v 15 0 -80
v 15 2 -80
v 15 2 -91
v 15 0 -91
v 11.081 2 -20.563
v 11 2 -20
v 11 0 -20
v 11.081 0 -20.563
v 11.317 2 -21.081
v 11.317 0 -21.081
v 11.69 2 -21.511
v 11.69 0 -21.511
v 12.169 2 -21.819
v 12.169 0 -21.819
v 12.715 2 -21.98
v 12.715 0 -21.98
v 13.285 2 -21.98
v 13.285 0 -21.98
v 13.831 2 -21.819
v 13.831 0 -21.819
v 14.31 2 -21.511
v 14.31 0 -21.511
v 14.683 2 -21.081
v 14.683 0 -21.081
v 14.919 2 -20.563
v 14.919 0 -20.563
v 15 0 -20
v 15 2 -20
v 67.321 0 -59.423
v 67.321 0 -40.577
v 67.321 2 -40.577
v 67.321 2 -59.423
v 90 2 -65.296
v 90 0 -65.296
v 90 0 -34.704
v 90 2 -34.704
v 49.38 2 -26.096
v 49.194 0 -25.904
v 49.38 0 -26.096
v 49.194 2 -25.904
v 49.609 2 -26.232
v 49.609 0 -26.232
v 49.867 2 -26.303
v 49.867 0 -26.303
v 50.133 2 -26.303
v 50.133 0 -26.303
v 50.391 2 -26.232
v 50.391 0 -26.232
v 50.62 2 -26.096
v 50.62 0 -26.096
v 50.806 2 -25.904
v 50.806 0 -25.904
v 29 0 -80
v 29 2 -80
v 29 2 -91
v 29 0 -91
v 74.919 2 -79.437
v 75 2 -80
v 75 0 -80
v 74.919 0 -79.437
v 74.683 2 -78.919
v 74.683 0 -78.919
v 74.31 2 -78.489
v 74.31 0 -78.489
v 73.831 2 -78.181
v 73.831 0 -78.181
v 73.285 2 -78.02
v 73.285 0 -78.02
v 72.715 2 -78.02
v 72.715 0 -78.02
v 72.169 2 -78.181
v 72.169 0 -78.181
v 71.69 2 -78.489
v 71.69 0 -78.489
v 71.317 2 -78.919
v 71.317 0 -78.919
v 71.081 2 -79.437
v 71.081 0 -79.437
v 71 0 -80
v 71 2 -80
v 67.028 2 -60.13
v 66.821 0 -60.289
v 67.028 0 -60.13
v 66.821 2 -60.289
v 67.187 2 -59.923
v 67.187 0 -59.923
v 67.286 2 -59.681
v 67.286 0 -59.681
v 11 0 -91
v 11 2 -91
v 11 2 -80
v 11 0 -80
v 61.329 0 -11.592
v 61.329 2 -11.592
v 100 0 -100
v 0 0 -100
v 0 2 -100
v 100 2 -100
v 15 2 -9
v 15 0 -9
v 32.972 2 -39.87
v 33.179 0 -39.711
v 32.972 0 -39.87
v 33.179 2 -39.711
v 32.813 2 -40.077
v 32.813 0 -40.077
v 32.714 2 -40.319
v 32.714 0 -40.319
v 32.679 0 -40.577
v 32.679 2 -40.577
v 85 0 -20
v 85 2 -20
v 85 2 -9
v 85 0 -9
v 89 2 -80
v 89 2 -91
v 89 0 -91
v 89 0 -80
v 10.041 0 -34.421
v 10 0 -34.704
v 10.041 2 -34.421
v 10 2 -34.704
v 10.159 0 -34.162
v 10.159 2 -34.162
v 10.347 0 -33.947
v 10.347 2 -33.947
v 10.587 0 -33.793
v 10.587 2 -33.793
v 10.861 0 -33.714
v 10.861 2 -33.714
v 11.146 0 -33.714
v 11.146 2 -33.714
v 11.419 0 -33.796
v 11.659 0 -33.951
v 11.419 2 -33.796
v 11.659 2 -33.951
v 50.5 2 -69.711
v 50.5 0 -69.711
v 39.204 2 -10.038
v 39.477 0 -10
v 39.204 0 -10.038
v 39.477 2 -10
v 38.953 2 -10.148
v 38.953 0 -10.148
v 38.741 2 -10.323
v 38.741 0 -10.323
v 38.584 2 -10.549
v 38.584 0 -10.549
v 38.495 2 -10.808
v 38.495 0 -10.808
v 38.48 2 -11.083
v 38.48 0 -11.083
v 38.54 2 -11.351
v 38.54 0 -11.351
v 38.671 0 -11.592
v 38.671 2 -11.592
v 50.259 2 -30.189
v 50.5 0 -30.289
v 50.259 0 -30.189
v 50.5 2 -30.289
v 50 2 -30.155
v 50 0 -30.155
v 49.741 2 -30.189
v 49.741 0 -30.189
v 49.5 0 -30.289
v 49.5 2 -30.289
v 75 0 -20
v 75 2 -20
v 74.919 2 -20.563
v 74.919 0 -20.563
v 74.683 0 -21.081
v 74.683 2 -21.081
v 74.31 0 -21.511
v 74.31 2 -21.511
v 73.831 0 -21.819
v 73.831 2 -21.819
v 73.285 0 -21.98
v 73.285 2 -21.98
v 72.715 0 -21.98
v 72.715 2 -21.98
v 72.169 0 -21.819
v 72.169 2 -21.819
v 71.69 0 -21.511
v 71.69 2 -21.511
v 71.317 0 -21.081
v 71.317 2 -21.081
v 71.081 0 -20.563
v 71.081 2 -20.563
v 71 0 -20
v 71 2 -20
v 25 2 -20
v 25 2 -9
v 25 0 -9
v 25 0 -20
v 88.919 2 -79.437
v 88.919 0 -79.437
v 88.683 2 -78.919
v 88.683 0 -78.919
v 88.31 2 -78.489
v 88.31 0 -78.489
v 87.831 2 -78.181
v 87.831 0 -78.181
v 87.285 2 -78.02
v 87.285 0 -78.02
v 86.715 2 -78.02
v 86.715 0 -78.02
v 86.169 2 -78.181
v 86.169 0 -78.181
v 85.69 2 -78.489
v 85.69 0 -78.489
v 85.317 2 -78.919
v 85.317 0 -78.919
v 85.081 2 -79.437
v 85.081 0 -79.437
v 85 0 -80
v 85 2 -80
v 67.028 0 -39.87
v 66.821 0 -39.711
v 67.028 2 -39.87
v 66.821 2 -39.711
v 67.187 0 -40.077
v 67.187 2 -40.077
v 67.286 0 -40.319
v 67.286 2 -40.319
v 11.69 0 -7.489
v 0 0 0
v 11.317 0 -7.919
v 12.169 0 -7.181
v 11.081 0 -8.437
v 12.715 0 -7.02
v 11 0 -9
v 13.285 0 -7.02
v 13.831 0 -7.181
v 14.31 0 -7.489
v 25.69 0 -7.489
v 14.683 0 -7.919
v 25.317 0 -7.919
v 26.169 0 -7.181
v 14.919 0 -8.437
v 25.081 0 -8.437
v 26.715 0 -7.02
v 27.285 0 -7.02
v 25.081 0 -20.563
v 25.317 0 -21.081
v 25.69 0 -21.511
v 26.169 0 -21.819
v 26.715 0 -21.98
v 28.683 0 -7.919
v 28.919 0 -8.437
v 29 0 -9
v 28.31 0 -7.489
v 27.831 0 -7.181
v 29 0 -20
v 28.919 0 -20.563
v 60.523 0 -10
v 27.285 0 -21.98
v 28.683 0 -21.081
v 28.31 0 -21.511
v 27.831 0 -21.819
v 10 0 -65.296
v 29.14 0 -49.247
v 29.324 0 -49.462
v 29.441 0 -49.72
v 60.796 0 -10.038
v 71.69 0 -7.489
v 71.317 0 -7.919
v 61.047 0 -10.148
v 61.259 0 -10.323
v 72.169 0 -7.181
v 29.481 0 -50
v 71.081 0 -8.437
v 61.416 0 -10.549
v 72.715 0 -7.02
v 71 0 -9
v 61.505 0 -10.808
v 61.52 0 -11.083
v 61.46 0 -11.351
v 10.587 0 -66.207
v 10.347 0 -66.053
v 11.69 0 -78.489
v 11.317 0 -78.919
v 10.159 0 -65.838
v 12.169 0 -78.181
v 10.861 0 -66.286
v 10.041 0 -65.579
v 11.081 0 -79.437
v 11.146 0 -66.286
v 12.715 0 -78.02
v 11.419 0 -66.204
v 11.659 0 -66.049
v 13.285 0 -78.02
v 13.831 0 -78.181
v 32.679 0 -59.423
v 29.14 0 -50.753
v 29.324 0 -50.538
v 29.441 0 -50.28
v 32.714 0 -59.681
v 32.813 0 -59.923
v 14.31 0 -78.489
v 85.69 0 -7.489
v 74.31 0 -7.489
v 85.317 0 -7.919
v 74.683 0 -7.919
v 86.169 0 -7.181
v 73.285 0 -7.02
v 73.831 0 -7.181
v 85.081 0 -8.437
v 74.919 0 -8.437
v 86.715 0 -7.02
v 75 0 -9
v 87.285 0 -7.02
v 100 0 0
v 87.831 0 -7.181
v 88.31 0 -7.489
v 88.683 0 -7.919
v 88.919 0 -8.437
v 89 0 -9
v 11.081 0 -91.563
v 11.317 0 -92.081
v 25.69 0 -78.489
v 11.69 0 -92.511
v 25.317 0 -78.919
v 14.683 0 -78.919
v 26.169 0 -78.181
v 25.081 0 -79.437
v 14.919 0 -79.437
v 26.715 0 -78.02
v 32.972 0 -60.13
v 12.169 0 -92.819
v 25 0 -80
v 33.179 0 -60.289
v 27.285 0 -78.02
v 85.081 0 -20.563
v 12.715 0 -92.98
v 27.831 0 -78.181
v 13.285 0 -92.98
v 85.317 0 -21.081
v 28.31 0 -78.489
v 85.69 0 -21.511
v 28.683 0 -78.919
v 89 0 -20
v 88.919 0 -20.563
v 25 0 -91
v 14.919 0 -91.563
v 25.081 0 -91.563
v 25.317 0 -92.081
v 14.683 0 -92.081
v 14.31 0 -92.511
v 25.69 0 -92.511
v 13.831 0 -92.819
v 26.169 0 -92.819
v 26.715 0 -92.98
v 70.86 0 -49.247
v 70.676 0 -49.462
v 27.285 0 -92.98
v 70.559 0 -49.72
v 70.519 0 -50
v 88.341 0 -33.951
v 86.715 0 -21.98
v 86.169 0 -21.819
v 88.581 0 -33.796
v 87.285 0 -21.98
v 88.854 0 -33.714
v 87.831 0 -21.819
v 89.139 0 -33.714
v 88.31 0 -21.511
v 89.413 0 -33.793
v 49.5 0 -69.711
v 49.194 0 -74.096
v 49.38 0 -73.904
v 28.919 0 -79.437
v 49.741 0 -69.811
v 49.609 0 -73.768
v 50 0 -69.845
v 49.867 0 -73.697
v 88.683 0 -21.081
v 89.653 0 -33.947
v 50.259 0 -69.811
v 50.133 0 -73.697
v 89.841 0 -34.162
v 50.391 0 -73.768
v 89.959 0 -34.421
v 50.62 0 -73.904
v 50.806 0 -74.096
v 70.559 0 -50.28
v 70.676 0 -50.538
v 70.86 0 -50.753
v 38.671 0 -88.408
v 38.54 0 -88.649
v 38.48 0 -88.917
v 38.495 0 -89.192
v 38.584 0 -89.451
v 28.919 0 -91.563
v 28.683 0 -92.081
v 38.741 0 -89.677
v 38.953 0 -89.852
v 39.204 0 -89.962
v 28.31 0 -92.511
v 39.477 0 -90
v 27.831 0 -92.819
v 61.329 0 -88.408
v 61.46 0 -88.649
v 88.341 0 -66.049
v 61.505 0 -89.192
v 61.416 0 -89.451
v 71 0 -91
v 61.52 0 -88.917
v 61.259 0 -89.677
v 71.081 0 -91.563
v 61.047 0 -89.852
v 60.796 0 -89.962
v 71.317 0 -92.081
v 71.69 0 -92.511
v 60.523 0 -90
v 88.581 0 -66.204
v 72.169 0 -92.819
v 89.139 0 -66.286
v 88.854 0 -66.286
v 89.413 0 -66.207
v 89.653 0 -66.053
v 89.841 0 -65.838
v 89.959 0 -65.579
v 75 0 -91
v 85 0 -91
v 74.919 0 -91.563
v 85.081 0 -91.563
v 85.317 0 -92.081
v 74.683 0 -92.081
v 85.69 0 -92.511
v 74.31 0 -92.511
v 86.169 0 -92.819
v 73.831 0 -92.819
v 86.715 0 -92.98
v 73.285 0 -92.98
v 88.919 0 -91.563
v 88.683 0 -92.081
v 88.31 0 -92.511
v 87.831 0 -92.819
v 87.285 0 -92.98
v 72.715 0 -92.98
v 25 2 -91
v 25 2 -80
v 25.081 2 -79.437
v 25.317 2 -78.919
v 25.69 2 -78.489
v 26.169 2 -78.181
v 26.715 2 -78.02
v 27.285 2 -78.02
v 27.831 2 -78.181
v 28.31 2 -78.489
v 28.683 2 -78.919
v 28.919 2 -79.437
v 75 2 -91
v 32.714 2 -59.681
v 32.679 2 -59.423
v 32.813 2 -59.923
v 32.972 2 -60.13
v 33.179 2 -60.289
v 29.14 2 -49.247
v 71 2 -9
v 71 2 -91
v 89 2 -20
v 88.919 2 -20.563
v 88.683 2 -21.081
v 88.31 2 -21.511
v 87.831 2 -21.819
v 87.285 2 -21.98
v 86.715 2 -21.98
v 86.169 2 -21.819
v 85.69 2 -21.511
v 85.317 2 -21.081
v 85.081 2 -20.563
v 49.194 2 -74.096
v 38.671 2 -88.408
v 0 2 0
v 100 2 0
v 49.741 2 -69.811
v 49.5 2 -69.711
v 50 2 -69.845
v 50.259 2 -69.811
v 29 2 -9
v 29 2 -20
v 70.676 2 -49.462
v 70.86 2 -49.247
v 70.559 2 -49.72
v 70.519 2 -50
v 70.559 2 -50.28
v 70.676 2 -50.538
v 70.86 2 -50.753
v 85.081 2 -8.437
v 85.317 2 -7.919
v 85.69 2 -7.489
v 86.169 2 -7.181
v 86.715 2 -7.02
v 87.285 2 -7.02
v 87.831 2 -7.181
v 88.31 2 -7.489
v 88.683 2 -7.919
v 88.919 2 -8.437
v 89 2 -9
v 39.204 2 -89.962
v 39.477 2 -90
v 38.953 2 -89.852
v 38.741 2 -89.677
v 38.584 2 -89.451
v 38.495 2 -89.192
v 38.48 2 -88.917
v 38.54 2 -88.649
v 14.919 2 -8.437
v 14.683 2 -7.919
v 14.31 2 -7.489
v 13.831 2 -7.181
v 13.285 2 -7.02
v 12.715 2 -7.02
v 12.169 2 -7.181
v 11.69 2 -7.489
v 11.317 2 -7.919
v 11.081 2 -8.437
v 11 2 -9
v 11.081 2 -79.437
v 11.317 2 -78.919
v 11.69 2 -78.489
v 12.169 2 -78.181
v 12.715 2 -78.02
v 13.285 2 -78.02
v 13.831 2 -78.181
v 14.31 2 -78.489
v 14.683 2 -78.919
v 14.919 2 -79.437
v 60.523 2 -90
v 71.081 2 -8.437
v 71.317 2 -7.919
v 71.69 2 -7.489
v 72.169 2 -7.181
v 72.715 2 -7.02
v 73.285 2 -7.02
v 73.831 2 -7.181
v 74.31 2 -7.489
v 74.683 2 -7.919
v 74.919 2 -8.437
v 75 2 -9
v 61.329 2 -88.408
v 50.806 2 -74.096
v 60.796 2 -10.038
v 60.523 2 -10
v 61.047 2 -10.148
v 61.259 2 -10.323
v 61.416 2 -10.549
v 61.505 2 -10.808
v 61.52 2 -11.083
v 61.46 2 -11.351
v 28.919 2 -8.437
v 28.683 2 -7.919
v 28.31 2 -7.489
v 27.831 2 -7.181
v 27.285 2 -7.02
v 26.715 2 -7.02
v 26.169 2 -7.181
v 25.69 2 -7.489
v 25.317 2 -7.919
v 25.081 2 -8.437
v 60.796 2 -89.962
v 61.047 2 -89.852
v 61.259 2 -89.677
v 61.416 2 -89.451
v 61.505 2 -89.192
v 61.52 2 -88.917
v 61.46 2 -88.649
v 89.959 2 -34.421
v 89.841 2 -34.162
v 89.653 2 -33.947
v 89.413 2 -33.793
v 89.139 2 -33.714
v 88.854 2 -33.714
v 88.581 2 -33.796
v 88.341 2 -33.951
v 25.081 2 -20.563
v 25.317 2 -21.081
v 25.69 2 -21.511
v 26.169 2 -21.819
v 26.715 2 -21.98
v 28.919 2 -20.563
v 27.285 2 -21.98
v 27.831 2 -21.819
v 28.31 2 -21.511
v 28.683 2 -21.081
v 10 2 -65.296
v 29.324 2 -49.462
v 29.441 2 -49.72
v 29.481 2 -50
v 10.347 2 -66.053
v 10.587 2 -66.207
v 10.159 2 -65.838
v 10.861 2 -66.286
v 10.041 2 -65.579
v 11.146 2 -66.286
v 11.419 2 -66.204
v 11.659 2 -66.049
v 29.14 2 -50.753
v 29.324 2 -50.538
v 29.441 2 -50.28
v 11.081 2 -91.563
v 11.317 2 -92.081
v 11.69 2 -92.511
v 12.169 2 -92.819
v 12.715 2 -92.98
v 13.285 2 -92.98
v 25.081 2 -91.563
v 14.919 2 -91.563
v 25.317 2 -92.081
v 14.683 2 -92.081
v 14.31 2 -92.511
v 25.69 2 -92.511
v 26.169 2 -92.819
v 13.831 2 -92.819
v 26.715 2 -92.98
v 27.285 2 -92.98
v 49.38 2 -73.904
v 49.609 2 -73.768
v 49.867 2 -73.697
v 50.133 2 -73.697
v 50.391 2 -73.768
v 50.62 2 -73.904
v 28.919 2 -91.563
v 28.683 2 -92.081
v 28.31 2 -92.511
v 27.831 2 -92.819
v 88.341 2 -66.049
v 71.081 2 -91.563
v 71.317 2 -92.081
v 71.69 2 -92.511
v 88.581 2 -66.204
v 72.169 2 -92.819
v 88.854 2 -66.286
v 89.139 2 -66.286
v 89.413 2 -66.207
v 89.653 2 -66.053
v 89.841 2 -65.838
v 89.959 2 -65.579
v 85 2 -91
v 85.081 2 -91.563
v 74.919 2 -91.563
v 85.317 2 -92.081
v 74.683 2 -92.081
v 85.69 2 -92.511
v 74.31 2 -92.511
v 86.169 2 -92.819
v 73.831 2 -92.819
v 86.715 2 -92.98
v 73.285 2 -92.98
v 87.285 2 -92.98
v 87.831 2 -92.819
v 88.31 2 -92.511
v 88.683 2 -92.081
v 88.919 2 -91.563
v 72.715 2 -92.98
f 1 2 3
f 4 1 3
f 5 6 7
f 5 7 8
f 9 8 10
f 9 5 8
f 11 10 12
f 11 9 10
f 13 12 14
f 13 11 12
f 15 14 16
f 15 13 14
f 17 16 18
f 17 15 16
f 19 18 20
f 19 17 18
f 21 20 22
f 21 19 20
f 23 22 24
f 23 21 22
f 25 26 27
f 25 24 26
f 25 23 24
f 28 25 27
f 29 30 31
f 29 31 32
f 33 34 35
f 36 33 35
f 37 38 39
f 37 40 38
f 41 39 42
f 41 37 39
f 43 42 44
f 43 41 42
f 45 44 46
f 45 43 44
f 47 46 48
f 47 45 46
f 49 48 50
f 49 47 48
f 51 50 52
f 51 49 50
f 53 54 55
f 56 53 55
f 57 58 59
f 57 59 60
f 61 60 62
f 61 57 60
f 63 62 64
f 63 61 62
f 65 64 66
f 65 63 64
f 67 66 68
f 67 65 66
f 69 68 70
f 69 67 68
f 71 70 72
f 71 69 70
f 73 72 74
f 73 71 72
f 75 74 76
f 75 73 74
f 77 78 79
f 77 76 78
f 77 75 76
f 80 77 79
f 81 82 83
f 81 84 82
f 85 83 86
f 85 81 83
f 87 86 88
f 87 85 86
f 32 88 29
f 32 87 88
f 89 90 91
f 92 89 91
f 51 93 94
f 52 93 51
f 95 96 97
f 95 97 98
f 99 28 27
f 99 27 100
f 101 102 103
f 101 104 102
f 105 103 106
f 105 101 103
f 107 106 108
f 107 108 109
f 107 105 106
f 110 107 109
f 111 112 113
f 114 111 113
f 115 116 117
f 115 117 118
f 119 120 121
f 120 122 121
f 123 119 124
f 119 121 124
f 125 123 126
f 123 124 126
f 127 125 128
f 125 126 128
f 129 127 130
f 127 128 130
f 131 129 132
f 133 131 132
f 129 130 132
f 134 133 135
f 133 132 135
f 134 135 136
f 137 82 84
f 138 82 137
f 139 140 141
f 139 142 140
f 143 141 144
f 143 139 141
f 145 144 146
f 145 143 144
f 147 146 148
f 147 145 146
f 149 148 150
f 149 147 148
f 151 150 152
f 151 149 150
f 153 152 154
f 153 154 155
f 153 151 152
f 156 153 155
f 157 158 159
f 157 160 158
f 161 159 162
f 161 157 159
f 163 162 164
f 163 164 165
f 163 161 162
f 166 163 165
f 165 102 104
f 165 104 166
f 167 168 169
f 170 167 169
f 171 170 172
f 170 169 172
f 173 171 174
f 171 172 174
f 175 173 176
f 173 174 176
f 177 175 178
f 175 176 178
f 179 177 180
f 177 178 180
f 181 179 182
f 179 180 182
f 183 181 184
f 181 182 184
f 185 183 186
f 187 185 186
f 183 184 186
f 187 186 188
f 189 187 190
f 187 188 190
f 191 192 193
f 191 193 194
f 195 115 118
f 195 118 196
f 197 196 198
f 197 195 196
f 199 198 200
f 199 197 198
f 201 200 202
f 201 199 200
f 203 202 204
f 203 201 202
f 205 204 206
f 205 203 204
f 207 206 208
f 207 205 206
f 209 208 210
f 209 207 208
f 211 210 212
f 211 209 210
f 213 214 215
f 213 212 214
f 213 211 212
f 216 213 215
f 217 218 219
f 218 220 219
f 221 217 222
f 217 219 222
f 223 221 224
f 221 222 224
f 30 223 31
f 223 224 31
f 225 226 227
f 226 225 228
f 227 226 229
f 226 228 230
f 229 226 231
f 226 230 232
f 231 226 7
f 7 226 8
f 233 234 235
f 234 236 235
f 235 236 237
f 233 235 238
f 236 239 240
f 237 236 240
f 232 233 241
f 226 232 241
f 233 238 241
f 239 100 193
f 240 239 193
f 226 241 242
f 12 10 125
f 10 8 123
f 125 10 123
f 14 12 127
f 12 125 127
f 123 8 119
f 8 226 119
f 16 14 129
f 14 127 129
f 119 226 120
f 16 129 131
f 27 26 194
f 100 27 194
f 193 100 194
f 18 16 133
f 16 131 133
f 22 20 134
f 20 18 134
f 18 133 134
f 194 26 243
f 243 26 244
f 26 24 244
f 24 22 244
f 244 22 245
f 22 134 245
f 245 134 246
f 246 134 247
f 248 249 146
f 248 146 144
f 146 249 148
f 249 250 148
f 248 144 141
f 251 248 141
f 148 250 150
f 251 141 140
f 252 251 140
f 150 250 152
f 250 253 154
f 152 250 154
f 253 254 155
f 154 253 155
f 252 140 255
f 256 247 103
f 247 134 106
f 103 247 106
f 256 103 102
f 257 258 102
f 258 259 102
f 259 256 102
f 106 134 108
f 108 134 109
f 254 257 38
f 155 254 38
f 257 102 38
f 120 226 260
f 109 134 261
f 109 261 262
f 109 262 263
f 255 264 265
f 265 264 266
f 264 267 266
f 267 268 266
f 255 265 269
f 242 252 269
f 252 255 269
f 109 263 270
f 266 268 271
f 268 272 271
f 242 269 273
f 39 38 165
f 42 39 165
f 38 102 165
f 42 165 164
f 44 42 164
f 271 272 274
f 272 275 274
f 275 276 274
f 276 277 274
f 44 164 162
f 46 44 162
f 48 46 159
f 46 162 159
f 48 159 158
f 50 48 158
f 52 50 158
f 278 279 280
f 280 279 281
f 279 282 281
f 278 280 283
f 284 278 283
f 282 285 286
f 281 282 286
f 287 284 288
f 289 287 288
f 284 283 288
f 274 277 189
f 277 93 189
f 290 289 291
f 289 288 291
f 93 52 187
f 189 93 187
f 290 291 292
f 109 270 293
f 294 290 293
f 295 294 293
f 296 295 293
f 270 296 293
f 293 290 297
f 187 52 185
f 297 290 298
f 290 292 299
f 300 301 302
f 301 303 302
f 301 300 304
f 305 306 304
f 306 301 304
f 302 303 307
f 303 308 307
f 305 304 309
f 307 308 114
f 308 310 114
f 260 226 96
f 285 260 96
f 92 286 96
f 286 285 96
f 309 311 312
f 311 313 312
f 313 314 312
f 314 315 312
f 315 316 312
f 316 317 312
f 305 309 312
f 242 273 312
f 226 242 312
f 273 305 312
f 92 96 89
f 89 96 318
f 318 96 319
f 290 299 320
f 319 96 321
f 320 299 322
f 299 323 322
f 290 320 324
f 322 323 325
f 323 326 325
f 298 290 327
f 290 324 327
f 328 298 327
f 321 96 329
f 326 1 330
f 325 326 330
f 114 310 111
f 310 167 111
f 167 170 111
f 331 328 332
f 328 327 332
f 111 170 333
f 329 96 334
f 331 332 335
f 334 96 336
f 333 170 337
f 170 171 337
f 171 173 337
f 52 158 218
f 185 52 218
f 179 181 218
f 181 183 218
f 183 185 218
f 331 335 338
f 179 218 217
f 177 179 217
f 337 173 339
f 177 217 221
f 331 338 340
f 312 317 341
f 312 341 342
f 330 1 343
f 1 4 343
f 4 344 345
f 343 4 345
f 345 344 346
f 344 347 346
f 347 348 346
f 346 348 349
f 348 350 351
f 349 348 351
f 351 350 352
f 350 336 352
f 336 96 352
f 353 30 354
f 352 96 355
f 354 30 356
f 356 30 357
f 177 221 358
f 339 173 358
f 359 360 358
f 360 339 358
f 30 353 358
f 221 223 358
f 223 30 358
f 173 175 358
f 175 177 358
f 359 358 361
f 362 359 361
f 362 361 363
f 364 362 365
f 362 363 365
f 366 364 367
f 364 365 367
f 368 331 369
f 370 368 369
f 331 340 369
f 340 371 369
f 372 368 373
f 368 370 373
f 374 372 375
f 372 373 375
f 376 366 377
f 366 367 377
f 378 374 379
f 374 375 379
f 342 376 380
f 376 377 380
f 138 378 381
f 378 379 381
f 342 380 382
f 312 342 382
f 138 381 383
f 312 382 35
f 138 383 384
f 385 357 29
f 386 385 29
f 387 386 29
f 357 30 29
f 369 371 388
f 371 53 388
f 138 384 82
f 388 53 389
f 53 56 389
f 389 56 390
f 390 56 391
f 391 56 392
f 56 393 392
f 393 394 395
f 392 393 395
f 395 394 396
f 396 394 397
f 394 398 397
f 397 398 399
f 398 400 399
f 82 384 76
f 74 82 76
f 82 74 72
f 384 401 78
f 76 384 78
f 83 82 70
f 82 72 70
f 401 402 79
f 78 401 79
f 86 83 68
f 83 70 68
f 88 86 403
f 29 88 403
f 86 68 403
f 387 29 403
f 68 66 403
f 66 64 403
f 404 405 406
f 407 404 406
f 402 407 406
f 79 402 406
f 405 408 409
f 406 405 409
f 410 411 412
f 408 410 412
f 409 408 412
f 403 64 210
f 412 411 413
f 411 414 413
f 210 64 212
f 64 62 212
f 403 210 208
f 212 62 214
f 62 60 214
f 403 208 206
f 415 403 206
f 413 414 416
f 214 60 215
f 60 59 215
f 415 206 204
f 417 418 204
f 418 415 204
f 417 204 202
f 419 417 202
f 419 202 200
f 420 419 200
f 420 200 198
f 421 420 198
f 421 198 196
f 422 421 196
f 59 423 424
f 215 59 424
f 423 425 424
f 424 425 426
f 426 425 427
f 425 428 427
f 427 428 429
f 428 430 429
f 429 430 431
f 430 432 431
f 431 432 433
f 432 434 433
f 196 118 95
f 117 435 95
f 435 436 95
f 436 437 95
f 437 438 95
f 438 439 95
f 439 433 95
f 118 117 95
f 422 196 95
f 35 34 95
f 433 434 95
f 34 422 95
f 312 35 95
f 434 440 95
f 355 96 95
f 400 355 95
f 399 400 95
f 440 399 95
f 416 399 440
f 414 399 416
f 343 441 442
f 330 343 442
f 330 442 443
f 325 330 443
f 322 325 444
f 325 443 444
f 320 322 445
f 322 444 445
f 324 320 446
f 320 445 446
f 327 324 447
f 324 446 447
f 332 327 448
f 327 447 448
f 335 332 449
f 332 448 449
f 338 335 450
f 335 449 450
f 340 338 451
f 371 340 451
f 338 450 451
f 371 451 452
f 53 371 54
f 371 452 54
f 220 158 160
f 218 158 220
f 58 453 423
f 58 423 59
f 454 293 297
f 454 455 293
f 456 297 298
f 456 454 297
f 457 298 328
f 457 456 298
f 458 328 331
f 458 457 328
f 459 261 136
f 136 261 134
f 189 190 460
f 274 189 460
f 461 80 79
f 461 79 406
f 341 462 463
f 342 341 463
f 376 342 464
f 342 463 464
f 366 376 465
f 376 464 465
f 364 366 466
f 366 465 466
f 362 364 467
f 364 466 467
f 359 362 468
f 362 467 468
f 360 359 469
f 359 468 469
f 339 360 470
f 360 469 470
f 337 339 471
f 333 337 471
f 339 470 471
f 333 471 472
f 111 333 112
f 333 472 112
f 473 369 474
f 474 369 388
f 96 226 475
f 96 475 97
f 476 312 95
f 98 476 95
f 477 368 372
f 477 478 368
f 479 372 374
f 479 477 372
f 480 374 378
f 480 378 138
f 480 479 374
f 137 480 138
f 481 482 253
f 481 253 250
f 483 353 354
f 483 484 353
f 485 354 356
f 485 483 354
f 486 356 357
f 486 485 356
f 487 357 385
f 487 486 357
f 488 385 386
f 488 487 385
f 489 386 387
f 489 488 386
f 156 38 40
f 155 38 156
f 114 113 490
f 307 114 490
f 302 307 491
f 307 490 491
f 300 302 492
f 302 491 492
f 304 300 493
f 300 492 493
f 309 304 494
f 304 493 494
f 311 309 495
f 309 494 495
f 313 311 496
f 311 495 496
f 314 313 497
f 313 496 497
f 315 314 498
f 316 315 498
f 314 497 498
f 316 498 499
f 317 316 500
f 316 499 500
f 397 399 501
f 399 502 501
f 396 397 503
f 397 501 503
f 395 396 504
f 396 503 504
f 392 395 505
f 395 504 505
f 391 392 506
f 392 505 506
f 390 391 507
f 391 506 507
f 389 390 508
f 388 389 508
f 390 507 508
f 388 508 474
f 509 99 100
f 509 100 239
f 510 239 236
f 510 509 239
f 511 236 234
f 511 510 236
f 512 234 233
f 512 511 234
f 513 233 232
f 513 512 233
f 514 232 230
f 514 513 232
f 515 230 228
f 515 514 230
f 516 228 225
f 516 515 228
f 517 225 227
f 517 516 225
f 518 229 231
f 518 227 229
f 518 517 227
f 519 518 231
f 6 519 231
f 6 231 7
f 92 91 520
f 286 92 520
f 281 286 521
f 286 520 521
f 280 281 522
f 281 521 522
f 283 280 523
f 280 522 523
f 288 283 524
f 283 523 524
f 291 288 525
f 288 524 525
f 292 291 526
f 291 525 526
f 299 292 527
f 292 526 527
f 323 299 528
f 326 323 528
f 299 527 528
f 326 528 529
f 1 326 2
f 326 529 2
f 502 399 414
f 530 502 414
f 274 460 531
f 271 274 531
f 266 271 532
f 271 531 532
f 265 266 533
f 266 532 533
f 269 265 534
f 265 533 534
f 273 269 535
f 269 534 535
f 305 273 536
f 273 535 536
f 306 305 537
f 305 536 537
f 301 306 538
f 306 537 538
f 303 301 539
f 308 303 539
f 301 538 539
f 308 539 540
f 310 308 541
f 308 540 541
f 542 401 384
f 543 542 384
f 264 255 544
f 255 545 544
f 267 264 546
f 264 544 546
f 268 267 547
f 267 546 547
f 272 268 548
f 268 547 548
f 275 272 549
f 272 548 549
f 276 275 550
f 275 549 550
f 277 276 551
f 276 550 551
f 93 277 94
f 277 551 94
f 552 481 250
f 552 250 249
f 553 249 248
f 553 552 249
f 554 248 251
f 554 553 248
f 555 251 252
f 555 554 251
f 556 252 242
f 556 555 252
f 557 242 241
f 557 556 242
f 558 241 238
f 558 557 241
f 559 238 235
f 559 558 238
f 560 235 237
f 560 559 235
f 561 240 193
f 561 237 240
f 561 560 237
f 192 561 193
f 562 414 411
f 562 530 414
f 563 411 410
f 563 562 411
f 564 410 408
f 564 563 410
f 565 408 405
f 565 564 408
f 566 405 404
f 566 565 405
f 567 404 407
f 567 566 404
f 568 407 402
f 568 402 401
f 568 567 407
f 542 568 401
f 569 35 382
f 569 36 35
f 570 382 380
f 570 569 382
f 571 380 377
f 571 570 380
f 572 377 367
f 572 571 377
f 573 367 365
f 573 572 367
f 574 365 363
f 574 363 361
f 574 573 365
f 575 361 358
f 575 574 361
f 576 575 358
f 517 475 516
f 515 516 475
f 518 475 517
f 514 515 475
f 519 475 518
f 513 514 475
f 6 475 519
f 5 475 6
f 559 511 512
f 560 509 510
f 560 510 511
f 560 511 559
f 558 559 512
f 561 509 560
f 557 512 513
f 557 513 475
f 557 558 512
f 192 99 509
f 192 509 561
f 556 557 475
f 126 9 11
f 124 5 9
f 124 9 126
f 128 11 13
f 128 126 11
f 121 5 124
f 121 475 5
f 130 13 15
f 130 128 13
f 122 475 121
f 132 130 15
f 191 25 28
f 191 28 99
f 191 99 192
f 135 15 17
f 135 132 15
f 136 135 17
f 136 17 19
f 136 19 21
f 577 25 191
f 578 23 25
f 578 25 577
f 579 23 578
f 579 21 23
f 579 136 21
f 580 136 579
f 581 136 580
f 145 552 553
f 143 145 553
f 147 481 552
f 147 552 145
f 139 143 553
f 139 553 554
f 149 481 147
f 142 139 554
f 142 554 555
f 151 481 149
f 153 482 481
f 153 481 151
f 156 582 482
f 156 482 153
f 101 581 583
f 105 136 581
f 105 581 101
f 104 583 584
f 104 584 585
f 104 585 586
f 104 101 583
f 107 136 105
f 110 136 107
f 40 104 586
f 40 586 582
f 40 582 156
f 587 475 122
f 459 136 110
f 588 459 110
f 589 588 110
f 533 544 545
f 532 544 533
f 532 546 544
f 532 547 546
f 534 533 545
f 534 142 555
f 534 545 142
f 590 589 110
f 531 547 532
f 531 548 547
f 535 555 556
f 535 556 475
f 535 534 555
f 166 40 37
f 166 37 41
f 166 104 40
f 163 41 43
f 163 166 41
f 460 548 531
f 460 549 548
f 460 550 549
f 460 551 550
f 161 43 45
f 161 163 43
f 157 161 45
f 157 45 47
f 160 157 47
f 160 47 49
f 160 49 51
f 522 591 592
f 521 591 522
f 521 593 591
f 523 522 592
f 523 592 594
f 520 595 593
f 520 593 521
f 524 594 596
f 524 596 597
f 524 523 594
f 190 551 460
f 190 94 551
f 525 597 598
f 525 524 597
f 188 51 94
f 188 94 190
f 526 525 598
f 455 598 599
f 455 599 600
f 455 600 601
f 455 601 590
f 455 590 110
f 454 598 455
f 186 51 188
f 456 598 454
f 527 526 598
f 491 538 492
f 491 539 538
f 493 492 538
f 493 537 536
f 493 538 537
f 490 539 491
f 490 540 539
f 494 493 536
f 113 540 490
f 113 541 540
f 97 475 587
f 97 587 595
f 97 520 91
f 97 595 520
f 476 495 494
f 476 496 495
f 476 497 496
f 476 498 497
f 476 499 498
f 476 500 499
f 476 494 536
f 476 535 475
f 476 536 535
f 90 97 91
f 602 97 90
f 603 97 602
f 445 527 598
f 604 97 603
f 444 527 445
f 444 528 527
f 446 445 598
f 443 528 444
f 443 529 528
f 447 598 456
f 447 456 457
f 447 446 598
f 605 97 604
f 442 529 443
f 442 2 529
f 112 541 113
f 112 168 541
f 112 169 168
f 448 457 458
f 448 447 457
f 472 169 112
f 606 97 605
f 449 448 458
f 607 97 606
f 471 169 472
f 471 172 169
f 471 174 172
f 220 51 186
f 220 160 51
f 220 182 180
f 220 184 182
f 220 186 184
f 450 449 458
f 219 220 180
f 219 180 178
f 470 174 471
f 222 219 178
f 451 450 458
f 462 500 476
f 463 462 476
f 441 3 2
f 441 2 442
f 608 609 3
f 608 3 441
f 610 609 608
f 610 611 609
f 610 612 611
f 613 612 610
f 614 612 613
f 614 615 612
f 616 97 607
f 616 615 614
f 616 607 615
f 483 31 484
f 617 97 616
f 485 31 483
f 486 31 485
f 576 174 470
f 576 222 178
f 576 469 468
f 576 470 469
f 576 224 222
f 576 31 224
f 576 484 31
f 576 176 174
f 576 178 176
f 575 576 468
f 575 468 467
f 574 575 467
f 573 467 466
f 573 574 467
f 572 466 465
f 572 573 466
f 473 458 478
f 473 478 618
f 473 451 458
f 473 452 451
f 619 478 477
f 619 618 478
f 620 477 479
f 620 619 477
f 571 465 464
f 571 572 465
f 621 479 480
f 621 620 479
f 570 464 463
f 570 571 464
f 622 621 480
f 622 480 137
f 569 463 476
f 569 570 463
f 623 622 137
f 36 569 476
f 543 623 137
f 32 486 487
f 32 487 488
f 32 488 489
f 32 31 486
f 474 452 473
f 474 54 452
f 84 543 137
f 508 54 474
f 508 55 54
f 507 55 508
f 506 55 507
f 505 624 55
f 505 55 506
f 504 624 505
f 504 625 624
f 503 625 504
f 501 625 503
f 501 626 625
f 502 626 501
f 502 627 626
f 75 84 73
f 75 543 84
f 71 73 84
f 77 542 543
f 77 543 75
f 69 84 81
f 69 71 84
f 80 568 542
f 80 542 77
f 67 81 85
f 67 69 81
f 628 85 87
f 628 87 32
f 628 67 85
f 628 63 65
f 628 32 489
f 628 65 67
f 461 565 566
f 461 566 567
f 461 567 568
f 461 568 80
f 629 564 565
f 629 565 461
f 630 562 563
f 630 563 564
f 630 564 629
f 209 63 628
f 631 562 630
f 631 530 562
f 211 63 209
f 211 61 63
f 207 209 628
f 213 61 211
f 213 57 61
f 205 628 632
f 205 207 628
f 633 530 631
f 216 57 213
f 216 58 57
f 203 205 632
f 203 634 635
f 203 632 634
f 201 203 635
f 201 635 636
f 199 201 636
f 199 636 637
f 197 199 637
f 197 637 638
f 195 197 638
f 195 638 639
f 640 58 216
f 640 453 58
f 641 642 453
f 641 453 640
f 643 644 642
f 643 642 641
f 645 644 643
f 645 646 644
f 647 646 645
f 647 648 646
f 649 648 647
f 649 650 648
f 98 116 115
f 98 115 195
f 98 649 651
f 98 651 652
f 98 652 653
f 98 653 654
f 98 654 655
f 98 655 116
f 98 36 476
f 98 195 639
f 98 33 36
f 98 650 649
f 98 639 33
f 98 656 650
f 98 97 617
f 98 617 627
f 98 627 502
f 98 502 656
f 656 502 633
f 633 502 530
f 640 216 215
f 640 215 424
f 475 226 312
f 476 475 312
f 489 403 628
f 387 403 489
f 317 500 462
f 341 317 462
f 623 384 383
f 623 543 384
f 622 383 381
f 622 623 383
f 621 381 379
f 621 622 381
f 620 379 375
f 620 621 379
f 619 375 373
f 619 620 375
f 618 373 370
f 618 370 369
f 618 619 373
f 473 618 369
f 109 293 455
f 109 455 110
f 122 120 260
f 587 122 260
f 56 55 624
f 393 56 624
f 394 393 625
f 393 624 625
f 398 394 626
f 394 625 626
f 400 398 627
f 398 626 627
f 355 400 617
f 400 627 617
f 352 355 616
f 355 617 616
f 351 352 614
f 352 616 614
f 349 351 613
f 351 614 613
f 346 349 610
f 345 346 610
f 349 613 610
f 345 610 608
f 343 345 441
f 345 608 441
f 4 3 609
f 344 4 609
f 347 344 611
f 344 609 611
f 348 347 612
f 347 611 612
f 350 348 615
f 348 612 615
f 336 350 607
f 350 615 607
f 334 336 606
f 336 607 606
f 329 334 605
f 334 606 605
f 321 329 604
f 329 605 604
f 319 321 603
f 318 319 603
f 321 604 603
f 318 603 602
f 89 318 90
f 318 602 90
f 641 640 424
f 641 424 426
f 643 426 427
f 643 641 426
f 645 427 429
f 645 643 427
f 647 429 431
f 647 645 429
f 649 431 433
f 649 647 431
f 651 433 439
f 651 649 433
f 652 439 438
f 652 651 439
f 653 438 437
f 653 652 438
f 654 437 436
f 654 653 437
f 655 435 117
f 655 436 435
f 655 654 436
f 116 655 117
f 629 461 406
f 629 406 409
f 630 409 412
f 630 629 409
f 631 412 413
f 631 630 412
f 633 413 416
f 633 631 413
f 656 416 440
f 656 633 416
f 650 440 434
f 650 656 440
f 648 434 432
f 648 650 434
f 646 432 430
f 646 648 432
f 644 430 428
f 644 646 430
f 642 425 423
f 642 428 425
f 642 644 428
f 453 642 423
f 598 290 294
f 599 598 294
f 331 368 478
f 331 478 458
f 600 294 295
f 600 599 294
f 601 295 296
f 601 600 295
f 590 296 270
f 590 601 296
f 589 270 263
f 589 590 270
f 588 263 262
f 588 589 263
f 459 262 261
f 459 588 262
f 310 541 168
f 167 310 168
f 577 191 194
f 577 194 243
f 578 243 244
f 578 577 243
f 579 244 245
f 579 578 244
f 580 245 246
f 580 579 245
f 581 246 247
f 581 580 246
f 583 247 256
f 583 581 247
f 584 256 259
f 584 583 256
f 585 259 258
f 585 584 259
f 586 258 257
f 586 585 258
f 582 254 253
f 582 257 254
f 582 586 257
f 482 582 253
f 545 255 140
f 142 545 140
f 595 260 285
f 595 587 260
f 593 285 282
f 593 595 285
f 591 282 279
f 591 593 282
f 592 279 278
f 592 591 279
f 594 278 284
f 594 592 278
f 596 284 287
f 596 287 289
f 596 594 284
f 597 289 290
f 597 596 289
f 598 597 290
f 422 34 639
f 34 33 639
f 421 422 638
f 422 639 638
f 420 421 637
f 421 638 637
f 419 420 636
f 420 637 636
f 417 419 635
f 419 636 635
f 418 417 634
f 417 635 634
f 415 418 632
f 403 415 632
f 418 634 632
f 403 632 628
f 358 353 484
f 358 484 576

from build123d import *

# Parameters (mm, degrees)
SKETCH1_W           = 100
SKETCH1_H           = 100
BOSS_EXTRUDE1_DEPTH = 2
FILLET1_R           = 1
FILLET2_R           = 1
CUT_EXTRUDE1_DEPTH  = 142.435497666


with BuildPart() as part:
    # Sketch1 → Boss-Extrude1 (new body)
    with BuildSketch(Plane(origin=(0, 0, 0), x_dir=(1, 0, 0), z_dir=(0, 1, 0))):
        with Locations((50, 50)):
            Rectangle(SKETCH1_W, SKETCH1_H)
        Polygon((10, 67.5), (30, 50), (10, 32.5), (10, 50), align=None, mode=Mode.SUBTRACT)
        Polygon((50, 30), (67.320508076, 40), (67.320508076, 60), (50, 70), (32.679491924, 60), (32.679491924, 40), align=None, mode=Mode.SUBTRACT)
        Polygon((90, 50), (90, 67.5), (70, 50), (90, 32.5), align=None, mode=Mode.SUBTRACT)
        Polygon((50, 10), (62.5, 10), (50, 27), (37.5, 10), align=None, mode=Mode.SUBTRACT)
        Polygon((50, 90), (62.5, 90), (50, 73), (37.5, 90), align=None, mode=Mode.SUBTRACT)
    extrude(amount=BOSS_EXTRUDE1_DEPTH)

    # Fillet1
    fillet1_edges = [part.edges().sort_by_distance(p)[0] for p in [
        (32.679491924, 1, -60),
        (50, 1, -70),
        (50, 1, -30),
        (67.320508076, 1, -40),
        (32.679491924, 1, -40),
        (67.320508076, 1, -60),
    ]]
    fillet(fillet1_edges, radius=FILLET1_R)

    # Fillet2
    fillet2_edges = [part.edges().sort_by_distance(p)[0] for p in [
        (50, 1, -73),
        (37.5, 1, -10),
        (10, 1, -32.5),
        (62.5, 1, -10),
        (90, 1, -32.5),
        (90, 1, -67.5),
        (62.5, 1, -90),
        (37.5, 1, -90),
        (10, 1, -67.5),
        (50, 1, -27),
        (30, 1, -50),
        (70, 1, -50),
    ]]
    fillet(fillet2_edges, radius=FILLET2_R)

    # Sketch2 → Cut-Extrude1 (cut, through all)
    with BuildSketch(Plane(origin=(0, 2, 0), x_dir=(1, 0, 0), z_dir=(0, 1, 0))):
        with BuildLine():
            Line((29, 80), (29, 91))
            ThreePointArc((29, 91), (27, 93), (25, 91))
            Line((25, 91), (25, 80))
            ThreePointArc((25, 80), (27, 78), (29, 80))
        make_face()
        with BuildLine():
            Line((15, 80), (15, 91))
            ThreePointArc((15, 91), (13, 93), (11, 91))
            Line((11, 91), (11, 80))
            ThreePointArc((11, 80), (13, 78), (15, 80))
        make_face()
        with BuildLine():
            ThreePointArc((75, 91), (73, 93), (71, 91))
            Line((71, 91), (71, 80))
            ThreePointArc((71, 80), (73, 78), (75, 80))
            Line((75, 80), (75, 91))
        make_face()
        with BuildLine():
            ThreePointArc((89, 91), (87, 93), (85, 91))
            Line((85, 91), (85, 80))
            ThreePointArc((85, 80), (87, 78), (89, 80))
            Line((89, 80), (89, 91))
        make_face()
        with BuildLine():
            ThreePointArc((25, 9), (27, 7), (29, 9))
            Line((29, 9), (29, 20))
            ThreePointArc((29, 20), (27, 22), (25, 20))
            Line((25, 20), (25, 9))
        make_face()
        with BuildLine():
            ThreePointArc((11, 9), (13, 7), (15, 9))
            Line((15, 9), (15, 20))
            ThreePointArc((15, 20), (13, 22), (11, 20))
            Line((11, 20), (11, 9))
        make_face()
        with BuildLine():
            Line((71, 20), (71, 9))
            ThreePointArc((71, 9), (73, 7), (75, 9))
            Line((75, 9), (75, 20))
            ThreePointArc((75, 20), (73, 22), (71, 20))
        make_face()
        with BuildLine():
            Line((85, 20), (85, 9))
            ThreePointArc((85, 9), (87, 7), (89, 9))
            Line((89, 9), (89, 20))
            ThreePointArc((89, 20), (87, 22), (85, 20))
        make_face()
    extrude(amount=-CUT_EXTRUDE1_DEPTH, mode=Mode.SUBTRACT)


solid = part.part
